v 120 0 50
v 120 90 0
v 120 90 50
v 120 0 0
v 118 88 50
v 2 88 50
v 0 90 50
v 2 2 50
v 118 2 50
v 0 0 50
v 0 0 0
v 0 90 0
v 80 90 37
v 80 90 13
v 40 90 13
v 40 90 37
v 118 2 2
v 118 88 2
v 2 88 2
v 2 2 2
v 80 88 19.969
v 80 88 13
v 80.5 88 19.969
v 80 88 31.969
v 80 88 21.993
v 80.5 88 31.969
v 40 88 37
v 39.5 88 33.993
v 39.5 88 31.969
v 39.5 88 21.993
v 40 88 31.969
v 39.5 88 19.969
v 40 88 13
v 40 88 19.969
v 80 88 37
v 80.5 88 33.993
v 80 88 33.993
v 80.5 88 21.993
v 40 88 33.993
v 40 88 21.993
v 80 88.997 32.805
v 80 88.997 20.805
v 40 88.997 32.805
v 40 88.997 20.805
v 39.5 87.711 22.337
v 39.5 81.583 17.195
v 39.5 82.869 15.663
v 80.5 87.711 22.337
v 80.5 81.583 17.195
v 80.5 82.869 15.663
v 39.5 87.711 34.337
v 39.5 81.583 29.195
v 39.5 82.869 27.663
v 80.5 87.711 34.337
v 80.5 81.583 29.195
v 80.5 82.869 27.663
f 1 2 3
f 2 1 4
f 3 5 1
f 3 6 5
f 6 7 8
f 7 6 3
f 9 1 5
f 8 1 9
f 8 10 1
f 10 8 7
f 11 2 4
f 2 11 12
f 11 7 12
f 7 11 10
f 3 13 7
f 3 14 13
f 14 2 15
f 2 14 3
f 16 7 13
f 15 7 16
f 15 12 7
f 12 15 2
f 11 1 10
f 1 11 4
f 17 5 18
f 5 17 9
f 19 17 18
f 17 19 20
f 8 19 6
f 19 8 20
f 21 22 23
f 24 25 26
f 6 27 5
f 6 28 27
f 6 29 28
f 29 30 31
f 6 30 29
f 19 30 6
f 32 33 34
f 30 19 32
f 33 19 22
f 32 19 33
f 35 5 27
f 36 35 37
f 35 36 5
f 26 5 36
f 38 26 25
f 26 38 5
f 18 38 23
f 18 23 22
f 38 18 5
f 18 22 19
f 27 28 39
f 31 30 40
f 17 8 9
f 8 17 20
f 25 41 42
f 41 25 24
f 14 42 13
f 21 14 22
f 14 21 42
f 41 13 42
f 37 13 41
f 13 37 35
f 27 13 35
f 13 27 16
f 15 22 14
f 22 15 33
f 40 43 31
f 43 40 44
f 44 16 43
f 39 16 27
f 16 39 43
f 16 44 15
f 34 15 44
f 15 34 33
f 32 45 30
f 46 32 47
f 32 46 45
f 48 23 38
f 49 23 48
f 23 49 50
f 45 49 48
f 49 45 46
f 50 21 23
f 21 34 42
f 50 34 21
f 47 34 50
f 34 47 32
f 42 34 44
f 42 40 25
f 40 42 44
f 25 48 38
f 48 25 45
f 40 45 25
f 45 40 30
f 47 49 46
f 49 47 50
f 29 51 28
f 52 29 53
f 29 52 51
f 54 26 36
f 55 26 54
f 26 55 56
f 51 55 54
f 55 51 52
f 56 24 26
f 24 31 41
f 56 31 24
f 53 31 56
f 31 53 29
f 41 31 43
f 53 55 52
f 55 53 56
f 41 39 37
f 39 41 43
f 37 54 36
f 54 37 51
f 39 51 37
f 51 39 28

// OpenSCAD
$fn = 32;

// ----------------------------------------------------------------------
// Vent box: louvers enclosure
// ----------------------------------------------------------------------

// --- parameters (mm) ---
box_l = 120;              // box length, X
box_w = 90;               // box width, Y
box_h = 50;               // box height, Z
wall_t = 2;               // shell wall thickness
win_l = 40;               // vent window width, X
win_h = 24;               // vent window height, Z
slat_t = 2;               // louver slat thickness
slat_d = 8;               // louver slat depth
slat_a = 40;              // louver slat angle, degrees
slat_pitch = 12;          // louver pitch
slat_yc = 85.29;          // slat centreline Y

win_z0 = (box_h - win_h) / 2;  // window lower edge Z
n_slats = 2;  // louver count
slat_z0 = win_z0 + (win_h - (n_slats - 1) * slat_pitch) / 2;

difference() {
  union() {
    difference() {
      cube([box_l, box_w, box_h]);
  translate([wall_t, wall_t, wall_t])
    cube([box_l - 2 * wall_t, box_w - 2 * wall_t, box_h]);
  translate([(box_l - win_l) / 2, box_w - wall_t - 1, win_z0])
    cube([win_l, wall_t + 2, win_h]);
    }
    for (i = [0 : n_slats - 1])
      translate([box_l / 2, slat_yc, slat_z0 + i * slat_pitch])
        rotate([slat_a, 0, 0])
          cube([win_l + 1, slat_d, slat_t], center = true);
  }
}
